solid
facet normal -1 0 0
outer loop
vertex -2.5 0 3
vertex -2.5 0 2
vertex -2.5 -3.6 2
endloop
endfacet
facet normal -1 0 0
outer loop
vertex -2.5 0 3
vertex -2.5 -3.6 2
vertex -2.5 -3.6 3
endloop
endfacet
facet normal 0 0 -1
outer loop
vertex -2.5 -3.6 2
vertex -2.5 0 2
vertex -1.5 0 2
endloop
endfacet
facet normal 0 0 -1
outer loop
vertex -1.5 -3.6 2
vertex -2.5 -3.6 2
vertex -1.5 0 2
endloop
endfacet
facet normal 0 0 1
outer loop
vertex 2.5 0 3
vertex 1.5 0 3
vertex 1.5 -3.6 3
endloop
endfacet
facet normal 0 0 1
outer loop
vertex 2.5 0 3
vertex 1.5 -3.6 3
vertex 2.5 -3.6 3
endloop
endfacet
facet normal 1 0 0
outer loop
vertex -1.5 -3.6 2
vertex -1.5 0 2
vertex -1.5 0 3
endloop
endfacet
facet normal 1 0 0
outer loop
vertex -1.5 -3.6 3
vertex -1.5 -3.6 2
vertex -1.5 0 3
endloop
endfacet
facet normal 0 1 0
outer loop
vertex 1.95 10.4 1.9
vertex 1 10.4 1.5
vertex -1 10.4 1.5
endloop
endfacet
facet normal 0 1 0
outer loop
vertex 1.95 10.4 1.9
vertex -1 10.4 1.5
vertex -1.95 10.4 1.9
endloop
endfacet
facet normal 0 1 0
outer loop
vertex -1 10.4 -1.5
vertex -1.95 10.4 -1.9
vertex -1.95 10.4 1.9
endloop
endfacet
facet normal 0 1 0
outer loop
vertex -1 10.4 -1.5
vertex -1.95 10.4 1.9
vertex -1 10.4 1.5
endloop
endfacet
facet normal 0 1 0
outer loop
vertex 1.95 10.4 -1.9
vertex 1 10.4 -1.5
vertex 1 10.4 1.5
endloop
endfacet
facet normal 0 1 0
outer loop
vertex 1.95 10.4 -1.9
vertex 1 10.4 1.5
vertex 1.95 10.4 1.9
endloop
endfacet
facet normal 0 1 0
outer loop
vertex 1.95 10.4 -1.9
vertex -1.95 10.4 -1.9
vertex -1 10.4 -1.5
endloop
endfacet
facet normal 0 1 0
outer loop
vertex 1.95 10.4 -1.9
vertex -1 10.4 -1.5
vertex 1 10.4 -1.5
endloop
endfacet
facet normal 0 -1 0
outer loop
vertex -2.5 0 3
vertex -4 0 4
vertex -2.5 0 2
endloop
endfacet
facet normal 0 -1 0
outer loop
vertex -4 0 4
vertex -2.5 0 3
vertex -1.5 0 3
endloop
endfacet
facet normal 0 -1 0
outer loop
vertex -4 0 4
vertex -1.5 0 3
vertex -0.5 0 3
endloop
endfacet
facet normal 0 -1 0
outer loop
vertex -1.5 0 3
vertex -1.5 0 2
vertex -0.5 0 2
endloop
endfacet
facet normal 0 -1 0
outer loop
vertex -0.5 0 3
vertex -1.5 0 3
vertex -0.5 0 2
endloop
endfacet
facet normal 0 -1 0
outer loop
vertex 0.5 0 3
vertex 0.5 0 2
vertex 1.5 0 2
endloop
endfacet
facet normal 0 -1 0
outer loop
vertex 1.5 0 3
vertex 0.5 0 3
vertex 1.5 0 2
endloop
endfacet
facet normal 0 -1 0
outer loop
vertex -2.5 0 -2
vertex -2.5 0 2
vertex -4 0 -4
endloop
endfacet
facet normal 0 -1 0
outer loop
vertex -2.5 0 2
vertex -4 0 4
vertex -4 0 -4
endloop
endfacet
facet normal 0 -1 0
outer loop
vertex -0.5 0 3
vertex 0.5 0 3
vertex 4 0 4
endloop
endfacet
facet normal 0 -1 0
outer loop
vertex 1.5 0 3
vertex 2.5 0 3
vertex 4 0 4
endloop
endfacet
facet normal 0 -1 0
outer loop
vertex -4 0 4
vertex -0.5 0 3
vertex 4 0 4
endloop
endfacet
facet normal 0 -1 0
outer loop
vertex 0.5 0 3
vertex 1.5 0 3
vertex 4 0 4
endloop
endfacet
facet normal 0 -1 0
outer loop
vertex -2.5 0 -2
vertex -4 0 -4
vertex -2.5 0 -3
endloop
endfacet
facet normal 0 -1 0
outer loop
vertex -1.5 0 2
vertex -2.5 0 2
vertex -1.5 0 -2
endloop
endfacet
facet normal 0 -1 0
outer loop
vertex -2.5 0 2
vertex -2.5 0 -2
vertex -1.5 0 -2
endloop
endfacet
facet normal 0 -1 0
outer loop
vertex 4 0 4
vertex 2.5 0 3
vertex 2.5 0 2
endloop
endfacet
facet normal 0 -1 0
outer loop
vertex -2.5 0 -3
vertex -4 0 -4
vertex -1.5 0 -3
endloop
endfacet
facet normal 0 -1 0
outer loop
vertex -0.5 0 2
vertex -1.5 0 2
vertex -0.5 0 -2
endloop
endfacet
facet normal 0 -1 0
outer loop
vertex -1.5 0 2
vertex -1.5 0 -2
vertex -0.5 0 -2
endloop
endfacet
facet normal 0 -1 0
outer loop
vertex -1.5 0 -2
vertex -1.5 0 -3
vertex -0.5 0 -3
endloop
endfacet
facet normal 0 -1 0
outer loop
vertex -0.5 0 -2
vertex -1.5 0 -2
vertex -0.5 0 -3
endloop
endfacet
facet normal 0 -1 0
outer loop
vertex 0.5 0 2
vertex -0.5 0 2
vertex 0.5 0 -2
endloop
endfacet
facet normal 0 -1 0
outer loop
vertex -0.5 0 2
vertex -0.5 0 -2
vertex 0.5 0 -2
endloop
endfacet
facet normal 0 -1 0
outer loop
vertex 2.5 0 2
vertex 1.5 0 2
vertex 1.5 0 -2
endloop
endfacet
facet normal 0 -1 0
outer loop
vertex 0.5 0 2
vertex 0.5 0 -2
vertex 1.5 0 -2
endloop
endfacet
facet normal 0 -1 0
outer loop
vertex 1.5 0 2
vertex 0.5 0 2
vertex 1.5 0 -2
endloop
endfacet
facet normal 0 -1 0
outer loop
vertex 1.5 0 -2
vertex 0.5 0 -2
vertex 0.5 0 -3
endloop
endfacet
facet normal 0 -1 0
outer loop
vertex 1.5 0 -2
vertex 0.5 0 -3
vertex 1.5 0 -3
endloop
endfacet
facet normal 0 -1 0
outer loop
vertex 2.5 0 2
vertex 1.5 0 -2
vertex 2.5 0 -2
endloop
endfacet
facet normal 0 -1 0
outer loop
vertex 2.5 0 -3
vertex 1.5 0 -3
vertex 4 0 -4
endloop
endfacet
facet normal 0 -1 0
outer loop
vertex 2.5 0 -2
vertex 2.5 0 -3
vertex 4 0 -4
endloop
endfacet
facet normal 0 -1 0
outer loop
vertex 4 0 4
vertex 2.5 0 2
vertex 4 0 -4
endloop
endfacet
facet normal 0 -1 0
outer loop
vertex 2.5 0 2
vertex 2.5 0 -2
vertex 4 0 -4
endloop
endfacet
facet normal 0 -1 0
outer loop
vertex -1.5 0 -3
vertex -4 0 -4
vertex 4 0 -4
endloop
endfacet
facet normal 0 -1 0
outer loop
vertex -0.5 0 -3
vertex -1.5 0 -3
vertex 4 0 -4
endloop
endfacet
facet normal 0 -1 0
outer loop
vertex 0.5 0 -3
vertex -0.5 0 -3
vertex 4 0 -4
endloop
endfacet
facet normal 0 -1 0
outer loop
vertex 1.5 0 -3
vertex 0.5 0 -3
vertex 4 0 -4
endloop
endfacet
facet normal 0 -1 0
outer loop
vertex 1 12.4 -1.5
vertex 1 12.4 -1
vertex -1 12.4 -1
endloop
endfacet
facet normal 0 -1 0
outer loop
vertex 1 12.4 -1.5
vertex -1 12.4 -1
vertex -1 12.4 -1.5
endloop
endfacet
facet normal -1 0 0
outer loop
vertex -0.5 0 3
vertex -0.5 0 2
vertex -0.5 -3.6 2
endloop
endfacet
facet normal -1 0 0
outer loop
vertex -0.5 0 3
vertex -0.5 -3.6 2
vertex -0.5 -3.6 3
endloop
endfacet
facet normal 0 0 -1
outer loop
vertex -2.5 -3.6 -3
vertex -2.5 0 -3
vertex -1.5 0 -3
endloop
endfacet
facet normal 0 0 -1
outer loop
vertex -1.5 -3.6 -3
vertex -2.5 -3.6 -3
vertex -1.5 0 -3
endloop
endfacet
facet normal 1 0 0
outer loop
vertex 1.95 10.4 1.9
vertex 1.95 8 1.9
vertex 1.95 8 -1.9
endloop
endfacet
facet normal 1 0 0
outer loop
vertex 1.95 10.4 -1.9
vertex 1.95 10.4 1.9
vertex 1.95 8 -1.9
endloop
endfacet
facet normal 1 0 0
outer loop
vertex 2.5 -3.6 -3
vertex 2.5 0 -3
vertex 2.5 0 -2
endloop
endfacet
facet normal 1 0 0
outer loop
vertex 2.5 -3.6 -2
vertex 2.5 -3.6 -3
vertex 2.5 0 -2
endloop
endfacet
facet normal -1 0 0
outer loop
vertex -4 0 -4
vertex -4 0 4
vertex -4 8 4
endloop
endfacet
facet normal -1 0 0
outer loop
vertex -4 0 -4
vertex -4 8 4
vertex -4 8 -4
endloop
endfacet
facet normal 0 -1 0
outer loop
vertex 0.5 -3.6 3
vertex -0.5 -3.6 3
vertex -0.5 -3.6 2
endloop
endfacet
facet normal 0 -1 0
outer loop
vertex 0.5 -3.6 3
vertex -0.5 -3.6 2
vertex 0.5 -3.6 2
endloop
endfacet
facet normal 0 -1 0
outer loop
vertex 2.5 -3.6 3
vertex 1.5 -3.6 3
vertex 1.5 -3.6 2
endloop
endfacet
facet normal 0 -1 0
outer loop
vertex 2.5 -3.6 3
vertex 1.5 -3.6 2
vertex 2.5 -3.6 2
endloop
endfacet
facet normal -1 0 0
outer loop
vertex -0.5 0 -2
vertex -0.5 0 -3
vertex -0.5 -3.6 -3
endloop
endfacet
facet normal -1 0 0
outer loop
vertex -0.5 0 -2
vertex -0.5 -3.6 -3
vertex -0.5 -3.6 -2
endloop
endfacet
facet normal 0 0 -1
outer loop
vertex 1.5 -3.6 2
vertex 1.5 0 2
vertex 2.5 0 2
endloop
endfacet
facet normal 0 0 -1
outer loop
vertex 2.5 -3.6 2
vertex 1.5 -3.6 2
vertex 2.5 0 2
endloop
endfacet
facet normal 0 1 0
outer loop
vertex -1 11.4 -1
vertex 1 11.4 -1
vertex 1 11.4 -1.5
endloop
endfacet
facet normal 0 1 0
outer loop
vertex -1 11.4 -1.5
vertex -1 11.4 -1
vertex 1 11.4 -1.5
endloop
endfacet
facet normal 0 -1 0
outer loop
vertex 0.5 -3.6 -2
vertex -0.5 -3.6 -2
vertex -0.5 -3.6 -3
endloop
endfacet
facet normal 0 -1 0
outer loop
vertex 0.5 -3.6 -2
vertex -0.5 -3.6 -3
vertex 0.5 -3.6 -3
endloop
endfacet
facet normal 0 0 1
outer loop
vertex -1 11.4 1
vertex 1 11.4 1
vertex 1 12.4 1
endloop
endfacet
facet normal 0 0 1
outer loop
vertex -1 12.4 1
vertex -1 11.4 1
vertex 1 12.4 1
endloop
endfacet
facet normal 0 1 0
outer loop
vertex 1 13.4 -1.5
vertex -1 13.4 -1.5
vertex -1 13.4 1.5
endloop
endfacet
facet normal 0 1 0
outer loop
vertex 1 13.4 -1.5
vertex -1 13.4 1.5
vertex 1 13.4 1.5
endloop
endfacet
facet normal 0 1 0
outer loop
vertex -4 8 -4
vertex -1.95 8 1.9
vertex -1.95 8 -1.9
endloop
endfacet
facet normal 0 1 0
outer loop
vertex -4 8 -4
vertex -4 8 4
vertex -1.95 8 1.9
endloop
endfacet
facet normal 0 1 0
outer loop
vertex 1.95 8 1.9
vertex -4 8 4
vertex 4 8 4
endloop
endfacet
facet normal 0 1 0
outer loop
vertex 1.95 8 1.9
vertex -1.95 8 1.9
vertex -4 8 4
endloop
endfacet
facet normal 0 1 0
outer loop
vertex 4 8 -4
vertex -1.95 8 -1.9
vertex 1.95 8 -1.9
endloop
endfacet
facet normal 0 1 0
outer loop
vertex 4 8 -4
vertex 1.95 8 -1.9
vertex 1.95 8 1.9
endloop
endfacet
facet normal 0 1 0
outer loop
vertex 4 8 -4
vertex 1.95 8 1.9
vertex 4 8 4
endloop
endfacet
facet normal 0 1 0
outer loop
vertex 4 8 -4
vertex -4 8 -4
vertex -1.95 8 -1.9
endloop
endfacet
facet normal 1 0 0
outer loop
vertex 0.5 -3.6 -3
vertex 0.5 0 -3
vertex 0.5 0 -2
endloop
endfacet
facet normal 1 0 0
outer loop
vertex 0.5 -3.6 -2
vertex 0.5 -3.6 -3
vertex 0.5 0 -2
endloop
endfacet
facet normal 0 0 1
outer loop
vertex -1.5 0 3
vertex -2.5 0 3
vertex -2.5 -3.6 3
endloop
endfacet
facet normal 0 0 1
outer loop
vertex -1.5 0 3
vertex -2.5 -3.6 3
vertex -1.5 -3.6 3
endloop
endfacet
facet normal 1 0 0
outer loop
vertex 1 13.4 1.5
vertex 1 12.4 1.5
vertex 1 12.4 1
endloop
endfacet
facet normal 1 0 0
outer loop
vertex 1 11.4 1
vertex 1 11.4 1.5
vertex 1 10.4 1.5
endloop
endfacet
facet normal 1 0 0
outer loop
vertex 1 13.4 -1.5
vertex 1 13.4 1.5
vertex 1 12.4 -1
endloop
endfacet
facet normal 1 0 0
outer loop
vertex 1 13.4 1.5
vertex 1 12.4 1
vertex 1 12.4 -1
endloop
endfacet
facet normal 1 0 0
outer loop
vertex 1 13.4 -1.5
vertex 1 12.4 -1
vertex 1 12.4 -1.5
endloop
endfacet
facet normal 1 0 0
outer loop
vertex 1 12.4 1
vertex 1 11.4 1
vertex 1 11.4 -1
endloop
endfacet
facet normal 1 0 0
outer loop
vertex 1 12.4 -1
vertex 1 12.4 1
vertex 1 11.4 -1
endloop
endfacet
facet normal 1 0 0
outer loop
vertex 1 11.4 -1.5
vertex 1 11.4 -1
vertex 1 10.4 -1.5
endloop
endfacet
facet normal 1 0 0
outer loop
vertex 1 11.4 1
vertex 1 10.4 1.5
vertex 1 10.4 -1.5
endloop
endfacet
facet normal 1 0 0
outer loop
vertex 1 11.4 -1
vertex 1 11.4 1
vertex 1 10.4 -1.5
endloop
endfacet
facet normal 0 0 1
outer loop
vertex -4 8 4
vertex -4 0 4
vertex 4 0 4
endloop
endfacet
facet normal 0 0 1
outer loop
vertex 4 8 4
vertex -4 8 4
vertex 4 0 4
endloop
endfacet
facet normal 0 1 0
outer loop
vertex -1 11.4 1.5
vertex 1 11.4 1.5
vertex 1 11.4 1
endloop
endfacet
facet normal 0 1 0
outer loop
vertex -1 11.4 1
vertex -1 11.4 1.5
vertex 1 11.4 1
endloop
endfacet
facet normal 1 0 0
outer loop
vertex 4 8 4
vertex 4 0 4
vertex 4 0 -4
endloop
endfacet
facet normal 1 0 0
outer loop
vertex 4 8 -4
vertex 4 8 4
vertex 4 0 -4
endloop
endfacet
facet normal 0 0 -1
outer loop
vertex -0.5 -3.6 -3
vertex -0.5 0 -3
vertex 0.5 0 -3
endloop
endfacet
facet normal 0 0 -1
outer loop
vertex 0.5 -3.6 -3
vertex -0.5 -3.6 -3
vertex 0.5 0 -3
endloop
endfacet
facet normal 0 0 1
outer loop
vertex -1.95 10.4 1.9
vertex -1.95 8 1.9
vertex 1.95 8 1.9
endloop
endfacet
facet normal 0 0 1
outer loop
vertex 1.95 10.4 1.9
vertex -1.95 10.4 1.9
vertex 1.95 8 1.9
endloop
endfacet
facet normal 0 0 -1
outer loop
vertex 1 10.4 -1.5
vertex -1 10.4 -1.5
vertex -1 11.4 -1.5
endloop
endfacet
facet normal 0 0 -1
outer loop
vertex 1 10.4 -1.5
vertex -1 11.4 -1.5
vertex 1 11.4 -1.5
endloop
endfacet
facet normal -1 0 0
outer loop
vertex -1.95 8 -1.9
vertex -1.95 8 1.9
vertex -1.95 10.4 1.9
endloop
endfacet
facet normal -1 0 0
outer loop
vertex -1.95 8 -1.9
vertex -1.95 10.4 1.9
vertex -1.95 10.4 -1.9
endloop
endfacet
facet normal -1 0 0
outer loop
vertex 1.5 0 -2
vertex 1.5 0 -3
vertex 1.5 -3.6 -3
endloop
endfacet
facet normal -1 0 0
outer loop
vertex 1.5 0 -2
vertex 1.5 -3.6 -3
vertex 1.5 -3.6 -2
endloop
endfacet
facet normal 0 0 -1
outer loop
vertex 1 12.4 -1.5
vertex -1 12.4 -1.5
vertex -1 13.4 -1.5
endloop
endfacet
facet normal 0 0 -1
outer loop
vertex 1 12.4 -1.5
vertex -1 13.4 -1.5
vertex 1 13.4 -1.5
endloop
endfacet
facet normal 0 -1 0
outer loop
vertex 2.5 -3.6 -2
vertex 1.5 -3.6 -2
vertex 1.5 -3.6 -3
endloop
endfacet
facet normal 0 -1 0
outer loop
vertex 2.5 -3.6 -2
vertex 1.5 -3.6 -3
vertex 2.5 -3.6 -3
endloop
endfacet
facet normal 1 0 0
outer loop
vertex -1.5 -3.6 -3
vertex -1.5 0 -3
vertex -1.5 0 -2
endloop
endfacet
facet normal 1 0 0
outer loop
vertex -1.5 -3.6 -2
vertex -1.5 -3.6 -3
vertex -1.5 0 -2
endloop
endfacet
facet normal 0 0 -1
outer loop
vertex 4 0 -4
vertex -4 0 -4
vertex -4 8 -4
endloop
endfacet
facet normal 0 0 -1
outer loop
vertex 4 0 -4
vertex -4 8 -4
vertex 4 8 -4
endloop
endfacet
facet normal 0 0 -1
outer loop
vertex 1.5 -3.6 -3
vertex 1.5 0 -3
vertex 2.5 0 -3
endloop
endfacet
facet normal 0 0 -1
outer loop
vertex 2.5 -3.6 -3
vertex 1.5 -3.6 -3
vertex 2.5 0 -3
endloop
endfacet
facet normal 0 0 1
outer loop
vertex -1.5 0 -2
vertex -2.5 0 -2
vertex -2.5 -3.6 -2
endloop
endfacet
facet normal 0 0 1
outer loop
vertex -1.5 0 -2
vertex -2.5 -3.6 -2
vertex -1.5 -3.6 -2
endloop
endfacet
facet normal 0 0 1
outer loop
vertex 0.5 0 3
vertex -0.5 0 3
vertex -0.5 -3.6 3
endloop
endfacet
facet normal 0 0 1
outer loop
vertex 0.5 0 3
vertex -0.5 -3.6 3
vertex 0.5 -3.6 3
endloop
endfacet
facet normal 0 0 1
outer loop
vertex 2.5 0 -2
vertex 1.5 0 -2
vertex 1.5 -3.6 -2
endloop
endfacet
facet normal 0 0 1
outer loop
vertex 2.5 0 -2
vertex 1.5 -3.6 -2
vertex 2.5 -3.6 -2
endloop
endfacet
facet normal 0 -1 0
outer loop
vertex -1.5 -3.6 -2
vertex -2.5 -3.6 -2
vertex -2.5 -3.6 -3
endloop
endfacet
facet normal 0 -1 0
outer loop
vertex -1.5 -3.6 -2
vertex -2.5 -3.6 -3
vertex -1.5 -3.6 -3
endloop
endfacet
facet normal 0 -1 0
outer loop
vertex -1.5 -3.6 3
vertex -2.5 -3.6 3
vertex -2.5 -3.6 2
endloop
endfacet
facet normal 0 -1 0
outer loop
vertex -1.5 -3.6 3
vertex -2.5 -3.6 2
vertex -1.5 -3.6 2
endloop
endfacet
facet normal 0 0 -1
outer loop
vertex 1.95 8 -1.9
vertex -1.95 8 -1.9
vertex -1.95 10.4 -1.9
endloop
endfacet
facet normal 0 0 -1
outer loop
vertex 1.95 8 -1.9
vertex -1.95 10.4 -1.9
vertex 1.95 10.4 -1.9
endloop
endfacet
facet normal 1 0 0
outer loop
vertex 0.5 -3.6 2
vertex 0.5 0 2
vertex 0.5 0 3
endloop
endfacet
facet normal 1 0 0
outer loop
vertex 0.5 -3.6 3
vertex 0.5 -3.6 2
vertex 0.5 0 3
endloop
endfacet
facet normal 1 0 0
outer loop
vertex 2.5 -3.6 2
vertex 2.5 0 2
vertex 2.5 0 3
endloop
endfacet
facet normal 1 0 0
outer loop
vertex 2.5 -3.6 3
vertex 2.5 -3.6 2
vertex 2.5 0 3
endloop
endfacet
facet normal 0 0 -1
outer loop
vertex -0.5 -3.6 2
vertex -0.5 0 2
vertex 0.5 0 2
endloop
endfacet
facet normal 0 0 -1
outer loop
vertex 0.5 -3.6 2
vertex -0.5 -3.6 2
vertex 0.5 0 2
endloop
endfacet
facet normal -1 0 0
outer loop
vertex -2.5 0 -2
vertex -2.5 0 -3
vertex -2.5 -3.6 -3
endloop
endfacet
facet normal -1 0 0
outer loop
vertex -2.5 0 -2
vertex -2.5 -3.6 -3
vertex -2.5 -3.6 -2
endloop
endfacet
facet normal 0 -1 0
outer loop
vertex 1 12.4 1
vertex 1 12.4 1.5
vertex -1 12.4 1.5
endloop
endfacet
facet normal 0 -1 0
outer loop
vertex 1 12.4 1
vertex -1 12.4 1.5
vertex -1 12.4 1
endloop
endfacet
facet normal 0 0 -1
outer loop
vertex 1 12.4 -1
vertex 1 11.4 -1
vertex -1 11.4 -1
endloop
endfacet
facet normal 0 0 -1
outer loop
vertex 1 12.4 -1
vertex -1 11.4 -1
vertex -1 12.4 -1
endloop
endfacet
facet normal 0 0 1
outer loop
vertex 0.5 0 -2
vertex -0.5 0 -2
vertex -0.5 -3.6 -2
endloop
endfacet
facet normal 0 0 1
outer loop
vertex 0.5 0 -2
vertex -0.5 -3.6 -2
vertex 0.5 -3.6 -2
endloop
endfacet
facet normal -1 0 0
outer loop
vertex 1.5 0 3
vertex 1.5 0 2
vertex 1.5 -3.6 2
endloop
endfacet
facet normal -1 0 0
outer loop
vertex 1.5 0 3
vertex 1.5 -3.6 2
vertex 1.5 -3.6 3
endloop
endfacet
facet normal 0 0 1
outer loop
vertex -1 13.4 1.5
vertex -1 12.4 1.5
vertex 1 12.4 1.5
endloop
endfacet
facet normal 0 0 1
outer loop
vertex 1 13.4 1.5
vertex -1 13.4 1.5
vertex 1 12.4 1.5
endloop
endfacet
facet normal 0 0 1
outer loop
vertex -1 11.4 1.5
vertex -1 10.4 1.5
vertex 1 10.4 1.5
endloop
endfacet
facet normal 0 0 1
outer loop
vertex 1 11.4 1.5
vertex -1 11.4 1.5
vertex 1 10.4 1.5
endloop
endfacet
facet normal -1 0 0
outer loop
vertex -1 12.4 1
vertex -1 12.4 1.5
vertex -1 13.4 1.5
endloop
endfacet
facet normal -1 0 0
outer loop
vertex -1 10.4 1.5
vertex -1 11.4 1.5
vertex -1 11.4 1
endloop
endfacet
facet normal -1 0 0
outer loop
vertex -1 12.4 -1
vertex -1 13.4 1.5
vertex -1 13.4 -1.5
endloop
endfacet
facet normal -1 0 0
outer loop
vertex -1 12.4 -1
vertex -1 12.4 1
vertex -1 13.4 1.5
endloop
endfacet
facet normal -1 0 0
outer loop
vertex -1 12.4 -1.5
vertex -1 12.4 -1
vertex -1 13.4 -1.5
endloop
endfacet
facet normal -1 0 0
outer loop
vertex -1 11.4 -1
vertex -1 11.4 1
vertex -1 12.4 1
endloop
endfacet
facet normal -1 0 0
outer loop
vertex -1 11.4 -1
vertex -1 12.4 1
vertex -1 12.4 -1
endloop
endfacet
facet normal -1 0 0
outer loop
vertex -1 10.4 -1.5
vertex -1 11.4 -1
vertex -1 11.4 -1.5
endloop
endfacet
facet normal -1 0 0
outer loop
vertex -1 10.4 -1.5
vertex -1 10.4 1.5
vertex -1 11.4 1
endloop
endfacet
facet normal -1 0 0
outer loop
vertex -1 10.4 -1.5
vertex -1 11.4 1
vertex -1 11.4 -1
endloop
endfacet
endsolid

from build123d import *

# Parameters (mm, degrees)
SKETCH1_W           = 8
SKETCH1_H           = 8
BOSS_EXTRUDE1_DEPTH = 8
SKETCH2_W           = 3.9
SKETCH2_H           = 3.8
BOSS_EXTRUDE2_DEPTH = 2.4
SKETCH3_W           = 2
SKETCH3_H           = 3
BOSS_EXTRUDE3_DEPTH = 3
SKETCH4_W           = 1
SKETCH4_H           = 1
BOSS_EXTRUDE4_DEPTH = 3.6
SKETCH5_W           = 0.5
SKETCH5_H           = 1
CUT_EXTRUDE1_DEPTH  = 15.851262573


with BuildPart() as part:
    # Sketch1 → Boss-Extrude1 (new body)
    with BuildSketch(Plane(origin=(0, 0, 0), x_dir=(1, 0, 0), z_dir=(0, 1, 0))):
        Rectangle(SKETCH1_W, SKETCH1_H)
    extrude(amount=BOSS_EXTRUDE1_DEPTH)

    # Sketch2 → Boss-Extrude2 (add)
    with BuildSketch(Plane(origin=(0, 8, 0), x_dir=(1, 0, 0), z_dir=(0, 1, 0))):
        Rectangle(SKETCH2_W, SKETCH2_H)
    extrude(amount=BOSS_EXTRUDE2_DEPTH)

    # Sketch3 → Boss-Extrude3 (add)
    with BuildSketch(Plane(origin=(0, 10.4, 0), x_dir=(1, 0, 0), z_dir=(0, 1, 0))):
        Rectangle(SKETCH3_W, SKETCH3_H)
    extrude(amount=BOSS_EXTRUDE3_DEPTH)

    # Sketch4 → Boss-Extrude4 (add)
    with BuildSketch(Plane.XZ):
        with Locations((0, 2.5)):
            Rectangle(SKETCH4_W, SKETCH4_H)
        with Locations((-2, 2.5)):
            Rectangle(SKETCH4_W, SKETCH4_H)
        with Locations((2, 2.5)):
            Rectangle(SKETCH4_W, SKETCH4_H)
        with Locations((0, -2.5)):
            Rectangle(SKETCH4_W, SKETCH4_H)
        with Locations((2, -2.5)):
            Rectangle(SKETCH4_W, SKETCH4_H)
        with Locations((-2, -2.5)):
            Rectangle(SKETCH4_W, SKETCH4_H)
    extrude(amount=BOSS_EXTRUDE4_DEPTH)

    # Sketch5 → Cut-Extrude1 (cut, through all)
    with BuildSketch(Plane(origin=(1, 0, 0), x_dir=(0, 0, -1), z_dir=(1, 0, 0))):
        with Locations((-1.25, 11.9)):
            Rectangle(SKETCH5_W, SKETCH5_H)
        with Locations((1.25, 11.9)):
            Rectangle(SKETCH5_W, SKETCH5_H)
    extrude(amount=-CUT_EXTRUDE1_DEPTH, mode=Mode.SUBTRACT)


solid = part.part
